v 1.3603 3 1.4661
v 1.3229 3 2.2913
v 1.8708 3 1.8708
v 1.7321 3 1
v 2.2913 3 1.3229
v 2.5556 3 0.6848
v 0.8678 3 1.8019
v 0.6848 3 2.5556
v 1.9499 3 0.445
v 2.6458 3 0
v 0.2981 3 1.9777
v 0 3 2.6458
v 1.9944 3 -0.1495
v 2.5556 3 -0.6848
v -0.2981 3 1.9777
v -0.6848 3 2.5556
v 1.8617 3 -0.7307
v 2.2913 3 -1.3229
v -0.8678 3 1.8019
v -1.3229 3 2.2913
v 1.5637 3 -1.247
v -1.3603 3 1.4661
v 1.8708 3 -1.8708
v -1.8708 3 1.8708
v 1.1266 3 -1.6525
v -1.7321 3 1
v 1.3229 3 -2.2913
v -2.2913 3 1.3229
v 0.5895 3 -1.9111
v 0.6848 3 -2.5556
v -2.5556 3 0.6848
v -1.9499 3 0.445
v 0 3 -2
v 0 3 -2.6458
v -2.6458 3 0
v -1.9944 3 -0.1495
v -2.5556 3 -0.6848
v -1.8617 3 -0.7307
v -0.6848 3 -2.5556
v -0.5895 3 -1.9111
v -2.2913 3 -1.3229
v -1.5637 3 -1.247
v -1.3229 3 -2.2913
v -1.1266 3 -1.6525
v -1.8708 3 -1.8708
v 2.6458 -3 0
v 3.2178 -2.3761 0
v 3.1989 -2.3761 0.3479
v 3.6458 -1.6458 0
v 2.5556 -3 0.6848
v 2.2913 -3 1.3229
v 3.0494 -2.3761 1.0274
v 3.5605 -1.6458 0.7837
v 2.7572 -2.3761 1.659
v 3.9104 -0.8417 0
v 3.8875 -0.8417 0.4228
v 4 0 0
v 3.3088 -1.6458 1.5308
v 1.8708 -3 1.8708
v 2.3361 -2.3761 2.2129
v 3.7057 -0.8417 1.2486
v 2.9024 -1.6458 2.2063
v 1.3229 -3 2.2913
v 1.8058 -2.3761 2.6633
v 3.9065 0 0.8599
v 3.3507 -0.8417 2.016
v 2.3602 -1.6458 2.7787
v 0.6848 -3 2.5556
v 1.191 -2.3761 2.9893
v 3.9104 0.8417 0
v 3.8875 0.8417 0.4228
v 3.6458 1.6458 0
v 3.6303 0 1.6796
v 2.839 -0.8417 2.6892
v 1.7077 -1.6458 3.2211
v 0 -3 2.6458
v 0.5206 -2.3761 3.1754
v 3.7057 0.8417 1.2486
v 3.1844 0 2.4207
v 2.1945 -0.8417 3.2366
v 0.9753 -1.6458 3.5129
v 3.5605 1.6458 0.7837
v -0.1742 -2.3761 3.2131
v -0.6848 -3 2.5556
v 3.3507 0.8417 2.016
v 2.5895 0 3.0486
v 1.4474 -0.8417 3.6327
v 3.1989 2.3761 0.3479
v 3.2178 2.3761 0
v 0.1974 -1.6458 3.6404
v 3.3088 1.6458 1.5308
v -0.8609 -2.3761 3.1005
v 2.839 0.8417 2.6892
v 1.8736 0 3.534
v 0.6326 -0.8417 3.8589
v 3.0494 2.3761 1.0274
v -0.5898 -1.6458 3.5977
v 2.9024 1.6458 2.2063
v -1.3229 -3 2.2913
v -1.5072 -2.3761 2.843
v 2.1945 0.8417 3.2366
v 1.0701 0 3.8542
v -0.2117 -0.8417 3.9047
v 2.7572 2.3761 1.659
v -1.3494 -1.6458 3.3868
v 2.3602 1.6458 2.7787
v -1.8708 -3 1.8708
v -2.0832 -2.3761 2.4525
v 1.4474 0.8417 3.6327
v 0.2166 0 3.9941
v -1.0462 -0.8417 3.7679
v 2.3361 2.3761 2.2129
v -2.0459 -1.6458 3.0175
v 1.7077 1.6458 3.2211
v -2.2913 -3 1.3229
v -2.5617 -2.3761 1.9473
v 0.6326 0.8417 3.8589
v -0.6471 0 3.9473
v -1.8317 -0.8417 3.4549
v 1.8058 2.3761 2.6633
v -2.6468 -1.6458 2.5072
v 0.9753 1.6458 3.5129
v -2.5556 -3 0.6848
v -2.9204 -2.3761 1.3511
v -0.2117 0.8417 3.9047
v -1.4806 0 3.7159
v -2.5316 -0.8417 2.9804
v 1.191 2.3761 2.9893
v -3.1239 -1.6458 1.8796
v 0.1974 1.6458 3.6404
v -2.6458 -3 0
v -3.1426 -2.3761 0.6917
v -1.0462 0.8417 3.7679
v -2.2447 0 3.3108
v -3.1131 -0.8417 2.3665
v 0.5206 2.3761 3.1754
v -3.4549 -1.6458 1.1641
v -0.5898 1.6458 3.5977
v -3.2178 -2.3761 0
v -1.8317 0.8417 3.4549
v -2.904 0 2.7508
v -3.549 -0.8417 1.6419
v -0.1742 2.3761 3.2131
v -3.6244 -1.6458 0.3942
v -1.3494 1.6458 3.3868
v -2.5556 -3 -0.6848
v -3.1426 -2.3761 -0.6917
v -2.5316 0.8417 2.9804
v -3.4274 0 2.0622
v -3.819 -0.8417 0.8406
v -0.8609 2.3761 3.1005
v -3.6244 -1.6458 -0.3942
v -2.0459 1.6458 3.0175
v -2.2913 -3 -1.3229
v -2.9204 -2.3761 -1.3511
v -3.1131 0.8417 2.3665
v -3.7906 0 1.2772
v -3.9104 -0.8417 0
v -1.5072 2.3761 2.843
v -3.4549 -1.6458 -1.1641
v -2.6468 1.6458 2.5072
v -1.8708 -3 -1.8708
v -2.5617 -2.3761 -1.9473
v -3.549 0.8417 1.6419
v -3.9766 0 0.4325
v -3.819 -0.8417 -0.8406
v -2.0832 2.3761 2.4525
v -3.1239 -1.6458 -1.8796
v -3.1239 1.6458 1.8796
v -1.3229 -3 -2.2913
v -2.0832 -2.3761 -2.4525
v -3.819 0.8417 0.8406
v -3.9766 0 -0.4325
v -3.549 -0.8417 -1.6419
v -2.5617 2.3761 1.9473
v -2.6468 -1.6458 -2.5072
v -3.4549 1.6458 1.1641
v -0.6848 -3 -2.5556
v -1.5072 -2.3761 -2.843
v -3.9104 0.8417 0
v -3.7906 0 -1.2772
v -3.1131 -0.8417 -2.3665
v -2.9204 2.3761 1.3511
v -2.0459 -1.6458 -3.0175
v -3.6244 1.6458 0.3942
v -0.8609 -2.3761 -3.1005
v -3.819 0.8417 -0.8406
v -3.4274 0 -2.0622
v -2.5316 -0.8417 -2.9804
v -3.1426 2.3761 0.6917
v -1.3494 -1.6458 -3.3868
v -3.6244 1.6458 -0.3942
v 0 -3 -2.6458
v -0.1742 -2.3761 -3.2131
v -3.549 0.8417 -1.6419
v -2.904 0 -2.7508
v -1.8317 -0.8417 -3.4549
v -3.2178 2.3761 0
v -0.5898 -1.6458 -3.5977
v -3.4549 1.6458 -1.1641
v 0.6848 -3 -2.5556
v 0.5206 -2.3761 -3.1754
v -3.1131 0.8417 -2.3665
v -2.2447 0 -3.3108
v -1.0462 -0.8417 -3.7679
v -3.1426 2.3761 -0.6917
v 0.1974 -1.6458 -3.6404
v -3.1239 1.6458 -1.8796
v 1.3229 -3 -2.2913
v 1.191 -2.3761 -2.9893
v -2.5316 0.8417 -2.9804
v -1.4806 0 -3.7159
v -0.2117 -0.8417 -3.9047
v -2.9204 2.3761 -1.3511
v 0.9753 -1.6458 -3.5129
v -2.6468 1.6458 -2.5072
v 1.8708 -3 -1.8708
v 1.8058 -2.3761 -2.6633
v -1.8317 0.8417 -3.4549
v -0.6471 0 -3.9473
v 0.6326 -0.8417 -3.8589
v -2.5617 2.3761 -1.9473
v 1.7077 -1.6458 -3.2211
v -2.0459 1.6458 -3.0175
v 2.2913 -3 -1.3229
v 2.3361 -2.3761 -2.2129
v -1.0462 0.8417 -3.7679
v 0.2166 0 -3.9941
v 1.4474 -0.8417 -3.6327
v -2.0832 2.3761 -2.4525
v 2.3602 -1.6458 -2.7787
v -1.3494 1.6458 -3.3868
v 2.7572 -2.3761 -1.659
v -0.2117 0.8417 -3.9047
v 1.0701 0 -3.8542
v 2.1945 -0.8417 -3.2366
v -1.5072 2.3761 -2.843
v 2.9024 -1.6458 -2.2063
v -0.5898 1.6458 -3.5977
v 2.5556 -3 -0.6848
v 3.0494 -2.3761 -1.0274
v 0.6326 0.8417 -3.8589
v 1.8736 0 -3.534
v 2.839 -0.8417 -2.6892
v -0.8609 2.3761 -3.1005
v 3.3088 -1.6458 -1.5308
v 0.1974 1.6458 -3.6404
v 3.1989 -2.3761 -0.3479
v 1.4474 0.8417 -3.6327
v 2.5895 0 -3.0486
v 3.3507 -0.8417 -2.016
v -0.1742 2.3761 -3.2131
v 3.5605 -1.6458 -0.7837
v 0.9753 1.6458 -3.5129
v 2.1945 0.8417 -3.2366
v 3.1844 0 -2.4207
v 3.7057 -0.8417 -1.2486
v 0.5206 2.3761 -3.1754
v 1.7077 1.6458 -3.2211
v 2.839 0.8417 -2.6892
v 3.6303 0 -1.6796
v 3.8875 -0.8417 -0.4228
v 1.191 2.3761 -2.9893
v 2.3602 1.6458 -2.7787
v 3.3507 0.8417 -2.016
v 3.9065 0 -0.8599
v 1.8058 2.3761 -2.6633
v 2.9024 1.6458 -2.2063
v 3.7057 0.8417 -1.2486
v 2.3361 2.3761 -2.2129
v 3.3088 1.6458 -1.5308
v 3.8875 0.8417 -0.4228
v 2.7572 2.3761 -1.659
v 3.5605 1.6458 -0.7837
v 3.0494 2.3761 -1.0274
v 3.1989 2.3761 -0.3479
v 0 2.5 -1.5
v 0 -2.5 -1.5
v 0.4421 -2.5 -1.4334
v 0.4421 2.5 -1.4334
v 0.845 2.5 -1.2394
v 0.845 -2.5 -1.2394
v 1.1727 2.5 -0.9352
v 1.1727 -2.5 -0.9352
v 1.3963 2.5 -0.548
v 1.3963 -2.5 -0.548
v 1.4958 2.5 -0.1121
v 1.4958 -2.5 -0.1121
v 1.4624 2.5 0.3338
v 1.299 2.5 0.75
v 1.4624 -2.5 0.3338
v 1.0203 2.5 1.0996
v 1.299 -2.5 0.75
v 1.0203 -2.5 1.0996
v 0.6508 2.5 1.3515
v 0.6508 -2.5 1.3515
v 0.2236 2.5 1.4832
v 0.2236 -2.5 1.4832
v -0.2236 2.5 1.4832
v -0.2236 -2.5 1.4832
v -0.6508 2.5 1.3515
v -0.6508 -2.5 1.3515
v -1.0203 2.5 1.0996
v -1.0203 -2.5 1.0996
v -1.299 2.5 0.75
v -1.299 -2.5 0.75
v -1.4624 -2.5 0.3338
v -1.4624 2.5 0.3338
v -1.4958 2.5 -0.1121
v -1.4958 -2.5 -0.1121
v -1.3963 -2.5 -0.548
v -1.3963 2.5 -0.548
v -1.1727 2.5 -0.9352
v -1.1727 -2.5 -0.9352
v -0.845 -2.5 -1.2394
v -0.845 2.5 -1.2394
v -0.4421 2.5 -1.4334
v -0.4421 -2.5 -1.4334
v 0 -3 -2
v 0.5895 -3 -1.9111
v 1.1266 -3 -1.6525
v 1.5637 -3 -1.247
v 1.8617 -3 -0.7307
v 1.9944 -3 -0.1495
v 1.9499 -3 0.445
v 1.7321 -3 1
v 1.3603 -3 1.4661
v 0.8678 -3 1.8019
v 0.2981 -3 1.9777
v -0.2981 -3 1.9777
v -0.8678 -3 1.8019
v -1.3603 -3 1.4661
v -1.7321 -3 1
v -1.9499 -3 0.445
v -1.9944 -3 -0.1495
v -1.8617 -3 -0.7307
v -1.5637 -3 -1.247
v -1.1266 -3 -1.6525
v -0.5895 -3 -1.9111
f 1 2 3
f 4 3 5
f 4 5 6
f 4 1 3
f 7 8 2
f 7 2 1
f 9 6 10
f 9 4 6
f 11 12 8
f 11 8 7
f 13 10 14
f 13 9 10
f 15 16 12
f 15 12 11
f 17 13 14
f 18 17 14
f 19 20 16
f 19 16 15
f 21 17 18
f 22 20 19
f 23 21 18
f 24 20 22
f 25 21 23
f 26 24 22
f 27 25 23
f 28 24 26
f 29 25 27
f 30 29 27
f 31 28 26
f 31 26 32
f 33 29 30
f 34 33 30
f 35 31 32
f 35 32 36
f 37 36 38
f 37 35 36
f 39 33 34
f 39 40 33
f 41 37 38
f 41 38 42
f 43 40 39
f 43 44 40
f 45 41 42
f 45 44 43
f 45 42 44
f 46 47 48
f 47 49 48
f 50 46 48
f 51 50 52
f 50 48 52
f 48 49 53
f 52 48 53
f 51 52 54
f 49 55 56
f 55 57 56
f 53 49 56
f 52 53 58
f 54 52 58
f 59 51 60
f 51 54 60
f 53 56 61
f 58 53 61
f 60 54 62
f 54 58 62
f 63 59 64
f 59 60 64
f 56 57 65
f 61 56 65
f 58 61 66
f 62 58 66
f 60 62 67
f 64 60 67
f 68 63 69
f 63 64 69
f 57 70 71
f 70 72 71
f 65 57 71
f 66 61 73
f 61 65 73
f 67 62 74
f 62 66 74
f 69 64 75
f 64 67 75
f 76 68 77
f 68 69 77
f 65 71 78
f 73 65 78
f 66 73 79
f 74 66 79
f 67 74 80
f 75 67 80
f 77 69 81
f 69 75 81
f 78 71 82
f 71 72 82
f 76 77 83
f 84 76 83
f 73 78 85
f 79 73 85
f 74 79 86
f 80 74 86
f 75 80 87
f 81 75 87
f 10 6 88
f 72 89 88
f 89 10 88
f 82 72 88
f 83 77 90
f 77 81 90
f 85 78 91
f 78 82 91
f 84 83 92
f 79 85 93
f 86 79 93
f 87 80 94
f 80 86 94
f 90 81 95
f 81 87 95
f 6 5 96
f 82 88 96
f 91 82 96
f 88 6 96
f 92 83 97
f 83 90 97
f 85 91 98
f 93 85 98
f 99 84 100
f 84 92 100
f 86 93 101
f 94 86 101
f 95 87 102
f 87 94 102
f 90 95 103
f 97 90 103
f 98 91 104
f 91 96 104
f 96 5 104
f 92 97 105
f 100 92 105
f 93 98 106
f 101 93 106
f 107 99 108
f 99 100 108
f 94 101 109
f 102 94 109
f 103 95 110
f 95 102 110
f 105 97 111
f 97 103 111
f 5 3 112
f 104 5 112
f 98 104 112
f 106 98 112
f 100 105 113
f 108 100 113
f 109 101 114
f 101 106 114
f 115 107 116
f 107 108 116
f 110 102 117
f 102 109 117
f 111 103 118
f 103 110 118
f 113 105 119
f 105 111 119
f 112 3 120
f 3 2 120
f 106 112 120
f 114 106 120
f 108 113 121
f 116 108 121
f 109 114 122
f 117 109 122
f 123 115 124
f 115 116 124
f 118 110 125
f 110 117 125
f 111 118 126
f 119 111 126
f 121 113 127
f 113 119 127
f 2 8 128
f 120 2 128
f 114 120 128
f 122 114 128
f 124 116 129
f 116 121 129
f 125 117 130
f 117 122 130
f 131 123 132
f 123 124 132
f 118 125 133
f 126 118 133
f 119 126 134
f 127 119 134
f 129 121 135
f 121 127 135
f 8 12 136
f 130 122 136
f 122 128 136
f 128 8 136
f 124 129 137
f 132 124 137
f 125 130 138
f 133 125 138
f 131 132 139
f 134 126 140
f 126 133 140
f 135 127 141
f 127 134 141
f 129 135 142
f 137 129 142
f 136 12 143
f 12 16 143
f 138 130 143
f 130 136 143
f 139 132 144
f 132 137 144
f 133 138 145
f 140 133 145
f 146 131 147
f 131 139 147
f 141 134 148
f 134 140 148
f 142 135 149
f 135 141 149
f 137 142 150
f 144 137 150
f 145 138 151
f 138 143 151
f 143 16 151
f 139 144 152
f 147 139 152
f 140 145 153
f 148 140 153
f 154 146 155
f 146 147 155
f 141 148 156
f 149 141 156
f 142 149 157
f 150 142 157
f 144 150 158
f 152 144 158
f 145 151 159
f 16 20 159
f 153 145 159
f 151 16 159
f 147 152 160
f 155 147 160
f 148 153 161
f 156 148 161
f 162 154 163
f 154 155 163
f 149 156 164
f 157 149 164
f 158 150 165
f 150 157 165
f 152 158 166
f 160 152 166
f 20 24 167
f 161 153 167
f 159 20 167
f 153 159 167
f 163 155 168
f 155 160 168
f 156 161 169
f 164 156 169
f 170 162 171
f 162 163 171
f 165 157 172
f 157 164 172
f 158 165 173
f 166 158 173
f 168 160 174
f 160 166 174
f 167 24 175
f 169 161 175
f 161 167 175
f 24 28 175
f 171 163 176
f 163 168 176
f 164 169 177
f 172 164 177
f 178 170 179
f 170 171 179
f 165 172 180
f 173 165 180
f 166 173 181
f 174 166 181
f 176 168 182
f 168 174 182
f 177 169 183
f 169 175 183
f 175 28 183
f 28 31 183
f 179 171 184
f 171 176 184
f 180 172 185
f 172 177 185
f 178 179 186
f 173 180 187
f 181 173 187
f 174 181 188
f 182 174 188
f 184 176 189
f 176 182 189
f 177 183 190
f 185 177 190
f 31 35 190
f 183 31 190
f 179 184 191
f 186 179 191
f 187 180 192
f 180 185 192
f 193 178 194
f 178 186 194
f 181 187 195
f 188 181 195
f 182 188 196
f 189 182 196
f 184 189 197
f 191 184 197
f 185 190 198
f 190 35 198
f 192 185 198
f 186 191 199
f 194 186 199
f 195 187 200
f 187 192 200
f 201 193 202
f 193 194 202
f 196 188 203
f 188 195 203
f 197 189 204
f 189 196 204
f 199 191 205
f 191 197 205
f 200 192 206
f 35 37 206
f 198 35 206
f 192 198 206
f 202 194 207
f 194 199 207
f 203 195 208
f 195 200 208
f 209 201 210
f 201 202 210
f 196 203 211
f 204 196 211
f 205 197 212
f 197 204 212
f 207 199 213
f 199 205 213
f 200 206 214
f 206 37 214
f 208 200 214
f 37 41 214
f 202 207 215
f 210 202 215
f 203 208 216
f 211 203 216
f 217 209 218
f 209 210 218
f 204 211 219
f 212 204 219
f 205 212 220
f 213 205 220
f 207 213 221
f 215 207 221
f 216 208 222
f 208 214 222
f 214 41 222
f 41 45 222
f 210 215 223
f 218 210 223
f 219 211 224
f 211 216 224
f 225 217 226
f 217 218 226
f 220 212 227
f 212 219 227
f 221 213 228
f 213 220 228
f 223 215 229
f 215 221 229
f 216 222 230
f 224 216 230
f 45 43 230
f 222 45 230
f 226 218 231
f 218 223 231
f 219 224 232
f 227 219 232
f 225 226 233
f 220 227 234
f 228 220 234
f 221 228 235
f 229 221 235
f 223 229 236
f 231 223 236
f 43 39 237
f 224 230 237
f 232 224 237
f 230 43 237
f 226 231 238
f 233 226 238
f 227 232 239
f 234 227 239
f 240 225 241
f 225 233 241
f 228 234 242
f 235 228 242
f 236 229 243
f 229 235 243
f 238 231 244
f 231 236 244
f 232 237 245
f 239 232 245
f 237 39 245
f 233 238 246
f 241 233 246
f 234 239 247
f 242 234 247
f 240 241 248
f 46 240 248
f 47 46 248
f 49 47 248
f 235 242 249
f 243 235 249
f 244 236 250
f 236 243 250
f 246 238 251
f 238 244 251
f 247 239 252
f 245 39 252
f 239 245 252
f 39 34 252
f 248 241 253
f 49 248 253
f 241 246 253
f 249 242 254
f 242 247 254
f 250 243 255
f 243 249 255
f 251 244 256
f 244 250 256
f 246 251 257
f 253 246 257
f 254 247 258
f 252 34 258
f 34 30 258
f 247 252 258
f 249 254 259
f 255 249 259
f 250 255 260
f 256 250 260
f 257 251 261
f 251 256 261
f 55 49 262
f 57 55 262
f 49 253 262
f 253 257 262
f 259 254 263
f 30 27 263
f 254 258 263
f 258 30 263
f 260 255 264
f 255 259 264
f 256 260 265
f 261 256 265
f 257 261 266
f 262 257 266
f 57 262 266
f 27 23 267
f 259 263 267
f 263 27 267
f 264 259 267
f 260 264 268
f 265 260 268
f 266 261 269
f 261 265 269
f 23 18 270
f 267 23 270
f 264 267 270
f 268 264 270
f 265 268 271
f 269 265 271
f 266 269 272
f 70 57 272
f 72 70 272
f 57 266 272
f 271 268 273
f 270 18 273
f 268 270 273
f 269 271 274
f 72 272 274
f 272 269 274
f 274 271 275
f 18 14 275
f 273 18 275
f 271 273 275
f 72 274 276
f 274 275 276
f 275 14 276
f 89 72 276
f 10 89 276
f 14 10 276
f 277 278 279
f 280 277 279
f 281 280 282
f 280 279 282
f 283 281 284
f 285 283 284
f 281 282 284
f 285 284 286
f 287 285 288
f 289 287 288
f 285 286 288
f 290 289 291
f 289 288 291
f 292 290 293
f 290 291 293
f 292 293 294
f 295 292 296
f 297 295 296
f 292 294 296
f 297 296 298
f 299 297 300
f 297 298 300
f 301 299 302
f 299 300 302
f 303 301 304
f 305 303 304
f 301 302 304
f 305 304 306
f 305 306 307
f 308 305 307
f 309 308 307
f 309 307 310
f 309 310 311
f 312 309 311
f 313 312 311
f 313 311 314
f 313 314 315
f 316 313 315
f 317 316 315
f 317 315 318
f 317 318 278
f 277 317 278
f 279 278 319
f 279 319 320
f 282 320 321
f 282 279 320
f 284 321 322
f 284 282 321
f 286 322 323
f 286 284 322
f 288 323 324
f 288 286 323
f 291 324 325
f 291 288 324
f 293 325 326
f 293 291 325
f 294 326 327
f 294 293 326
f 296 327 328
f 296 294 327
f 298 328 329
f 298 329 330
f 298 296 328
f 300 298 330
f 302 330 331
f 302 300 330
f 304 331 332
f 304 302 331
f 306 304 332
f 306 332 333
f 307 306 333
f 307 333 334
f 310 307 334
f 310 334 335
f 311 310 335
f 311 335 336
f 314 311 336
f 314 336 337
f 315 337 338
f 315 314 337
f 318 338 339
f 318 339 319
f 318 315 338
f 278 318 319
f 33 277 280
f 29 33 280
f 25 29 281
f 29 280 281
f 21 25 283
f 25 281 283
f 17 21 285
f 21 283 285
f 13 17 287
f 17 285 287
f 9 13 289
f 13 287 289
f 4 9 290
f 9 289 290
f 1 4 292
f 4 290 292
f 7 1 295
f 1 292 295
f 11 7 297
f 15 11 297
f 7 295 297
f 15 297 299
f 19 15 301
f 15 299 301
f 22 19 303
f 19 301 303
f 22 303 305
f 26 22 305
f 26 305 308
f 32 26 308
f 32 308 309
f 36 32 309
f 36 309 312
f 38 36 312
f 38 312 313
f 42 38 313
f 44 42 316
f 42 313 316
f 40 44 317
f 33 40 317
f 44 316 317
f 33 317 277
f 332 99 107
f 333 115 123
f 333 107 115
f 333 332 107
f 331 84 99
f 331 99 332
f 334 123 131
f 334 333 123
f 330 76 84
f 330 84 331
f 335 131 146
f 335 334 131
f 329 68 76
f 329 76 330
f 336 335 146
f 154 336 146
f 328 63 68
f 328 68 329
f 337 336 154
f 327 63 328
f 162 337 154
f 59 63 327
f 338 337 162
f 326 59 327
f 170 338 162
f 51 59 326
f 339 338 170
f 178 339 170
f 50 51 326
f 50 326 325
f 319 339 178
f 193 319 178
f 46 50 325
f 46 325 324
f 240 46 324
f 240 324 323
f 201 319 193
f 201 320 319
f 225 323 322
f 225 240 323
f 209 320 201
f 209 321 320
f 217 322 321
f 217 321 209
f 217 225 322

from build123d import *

# Parameters (mm, degrees)
CUT_EXTRUDE_1_DEPTH = 5
SKETCH_4_R          = 1.5
CUT_EXTRUDE_2_DEPTH = 10
CHAMFER_1_SIZE      = 0.5


with BuildPart() as part:
    # 草图1 → 旋转1 (revolve)
    with BuildSketch(Plane.XY):
        with BuildLine():
            Line((0, 4), (0, -4))
            ThreePointArc((0, -4), (4, 0), (0, 4))
        make_face()
    revolve(axis=Axis((0, 4, 0), (0, -1, 0)))

    # 草图3 → 切除-拉伸1 (cut, symmetric)
    with BuildSketch(Plane(origin=(0, 0, 0), x_dir=(0, 0, -1), z_dir=(1, 0, 0))):
        with BuildLine():
            Line((-2.645751311, 3), (2.645751311, 3))
            ThreePointArc((2.645751311, 3), (0, 4), (-2.645751311, 3))
        make_face()
        with BuildLine():
            Line((-2.645751311, -3), (2.645751311, -3))
            ThreePointArc((2.645751311, -3), (0, -4), (-2.645751311, -3))
        make_face()
    extrude(amount=CUT_EXTRUDE_1_DEPTH, both=True, mode=Mode.SUBTRACT)

    # 草图4 → 切除-拉伸2 (cut)
    with BuildSketch(Plane.XZ.offset(3)):
        with Locations(Location((0, 0, 0), (0, 0, 270))):
            Circle(SKETCH_4_R)
    extrude(amount=-CUT_EXTRUDE_2_DEPTH, mode=Mode.SUBTRACT)

    # 倒角1
    chamfer_1_edges = [part.edges().sort_by_distance(p)[0] for p in [
        (0, 3, 1.5),
        (0, -3, 1.5),
    ]]
    chamfer(chamfer_1_edges, length=CHAMFER_1_SIZE)


solid = part.part
